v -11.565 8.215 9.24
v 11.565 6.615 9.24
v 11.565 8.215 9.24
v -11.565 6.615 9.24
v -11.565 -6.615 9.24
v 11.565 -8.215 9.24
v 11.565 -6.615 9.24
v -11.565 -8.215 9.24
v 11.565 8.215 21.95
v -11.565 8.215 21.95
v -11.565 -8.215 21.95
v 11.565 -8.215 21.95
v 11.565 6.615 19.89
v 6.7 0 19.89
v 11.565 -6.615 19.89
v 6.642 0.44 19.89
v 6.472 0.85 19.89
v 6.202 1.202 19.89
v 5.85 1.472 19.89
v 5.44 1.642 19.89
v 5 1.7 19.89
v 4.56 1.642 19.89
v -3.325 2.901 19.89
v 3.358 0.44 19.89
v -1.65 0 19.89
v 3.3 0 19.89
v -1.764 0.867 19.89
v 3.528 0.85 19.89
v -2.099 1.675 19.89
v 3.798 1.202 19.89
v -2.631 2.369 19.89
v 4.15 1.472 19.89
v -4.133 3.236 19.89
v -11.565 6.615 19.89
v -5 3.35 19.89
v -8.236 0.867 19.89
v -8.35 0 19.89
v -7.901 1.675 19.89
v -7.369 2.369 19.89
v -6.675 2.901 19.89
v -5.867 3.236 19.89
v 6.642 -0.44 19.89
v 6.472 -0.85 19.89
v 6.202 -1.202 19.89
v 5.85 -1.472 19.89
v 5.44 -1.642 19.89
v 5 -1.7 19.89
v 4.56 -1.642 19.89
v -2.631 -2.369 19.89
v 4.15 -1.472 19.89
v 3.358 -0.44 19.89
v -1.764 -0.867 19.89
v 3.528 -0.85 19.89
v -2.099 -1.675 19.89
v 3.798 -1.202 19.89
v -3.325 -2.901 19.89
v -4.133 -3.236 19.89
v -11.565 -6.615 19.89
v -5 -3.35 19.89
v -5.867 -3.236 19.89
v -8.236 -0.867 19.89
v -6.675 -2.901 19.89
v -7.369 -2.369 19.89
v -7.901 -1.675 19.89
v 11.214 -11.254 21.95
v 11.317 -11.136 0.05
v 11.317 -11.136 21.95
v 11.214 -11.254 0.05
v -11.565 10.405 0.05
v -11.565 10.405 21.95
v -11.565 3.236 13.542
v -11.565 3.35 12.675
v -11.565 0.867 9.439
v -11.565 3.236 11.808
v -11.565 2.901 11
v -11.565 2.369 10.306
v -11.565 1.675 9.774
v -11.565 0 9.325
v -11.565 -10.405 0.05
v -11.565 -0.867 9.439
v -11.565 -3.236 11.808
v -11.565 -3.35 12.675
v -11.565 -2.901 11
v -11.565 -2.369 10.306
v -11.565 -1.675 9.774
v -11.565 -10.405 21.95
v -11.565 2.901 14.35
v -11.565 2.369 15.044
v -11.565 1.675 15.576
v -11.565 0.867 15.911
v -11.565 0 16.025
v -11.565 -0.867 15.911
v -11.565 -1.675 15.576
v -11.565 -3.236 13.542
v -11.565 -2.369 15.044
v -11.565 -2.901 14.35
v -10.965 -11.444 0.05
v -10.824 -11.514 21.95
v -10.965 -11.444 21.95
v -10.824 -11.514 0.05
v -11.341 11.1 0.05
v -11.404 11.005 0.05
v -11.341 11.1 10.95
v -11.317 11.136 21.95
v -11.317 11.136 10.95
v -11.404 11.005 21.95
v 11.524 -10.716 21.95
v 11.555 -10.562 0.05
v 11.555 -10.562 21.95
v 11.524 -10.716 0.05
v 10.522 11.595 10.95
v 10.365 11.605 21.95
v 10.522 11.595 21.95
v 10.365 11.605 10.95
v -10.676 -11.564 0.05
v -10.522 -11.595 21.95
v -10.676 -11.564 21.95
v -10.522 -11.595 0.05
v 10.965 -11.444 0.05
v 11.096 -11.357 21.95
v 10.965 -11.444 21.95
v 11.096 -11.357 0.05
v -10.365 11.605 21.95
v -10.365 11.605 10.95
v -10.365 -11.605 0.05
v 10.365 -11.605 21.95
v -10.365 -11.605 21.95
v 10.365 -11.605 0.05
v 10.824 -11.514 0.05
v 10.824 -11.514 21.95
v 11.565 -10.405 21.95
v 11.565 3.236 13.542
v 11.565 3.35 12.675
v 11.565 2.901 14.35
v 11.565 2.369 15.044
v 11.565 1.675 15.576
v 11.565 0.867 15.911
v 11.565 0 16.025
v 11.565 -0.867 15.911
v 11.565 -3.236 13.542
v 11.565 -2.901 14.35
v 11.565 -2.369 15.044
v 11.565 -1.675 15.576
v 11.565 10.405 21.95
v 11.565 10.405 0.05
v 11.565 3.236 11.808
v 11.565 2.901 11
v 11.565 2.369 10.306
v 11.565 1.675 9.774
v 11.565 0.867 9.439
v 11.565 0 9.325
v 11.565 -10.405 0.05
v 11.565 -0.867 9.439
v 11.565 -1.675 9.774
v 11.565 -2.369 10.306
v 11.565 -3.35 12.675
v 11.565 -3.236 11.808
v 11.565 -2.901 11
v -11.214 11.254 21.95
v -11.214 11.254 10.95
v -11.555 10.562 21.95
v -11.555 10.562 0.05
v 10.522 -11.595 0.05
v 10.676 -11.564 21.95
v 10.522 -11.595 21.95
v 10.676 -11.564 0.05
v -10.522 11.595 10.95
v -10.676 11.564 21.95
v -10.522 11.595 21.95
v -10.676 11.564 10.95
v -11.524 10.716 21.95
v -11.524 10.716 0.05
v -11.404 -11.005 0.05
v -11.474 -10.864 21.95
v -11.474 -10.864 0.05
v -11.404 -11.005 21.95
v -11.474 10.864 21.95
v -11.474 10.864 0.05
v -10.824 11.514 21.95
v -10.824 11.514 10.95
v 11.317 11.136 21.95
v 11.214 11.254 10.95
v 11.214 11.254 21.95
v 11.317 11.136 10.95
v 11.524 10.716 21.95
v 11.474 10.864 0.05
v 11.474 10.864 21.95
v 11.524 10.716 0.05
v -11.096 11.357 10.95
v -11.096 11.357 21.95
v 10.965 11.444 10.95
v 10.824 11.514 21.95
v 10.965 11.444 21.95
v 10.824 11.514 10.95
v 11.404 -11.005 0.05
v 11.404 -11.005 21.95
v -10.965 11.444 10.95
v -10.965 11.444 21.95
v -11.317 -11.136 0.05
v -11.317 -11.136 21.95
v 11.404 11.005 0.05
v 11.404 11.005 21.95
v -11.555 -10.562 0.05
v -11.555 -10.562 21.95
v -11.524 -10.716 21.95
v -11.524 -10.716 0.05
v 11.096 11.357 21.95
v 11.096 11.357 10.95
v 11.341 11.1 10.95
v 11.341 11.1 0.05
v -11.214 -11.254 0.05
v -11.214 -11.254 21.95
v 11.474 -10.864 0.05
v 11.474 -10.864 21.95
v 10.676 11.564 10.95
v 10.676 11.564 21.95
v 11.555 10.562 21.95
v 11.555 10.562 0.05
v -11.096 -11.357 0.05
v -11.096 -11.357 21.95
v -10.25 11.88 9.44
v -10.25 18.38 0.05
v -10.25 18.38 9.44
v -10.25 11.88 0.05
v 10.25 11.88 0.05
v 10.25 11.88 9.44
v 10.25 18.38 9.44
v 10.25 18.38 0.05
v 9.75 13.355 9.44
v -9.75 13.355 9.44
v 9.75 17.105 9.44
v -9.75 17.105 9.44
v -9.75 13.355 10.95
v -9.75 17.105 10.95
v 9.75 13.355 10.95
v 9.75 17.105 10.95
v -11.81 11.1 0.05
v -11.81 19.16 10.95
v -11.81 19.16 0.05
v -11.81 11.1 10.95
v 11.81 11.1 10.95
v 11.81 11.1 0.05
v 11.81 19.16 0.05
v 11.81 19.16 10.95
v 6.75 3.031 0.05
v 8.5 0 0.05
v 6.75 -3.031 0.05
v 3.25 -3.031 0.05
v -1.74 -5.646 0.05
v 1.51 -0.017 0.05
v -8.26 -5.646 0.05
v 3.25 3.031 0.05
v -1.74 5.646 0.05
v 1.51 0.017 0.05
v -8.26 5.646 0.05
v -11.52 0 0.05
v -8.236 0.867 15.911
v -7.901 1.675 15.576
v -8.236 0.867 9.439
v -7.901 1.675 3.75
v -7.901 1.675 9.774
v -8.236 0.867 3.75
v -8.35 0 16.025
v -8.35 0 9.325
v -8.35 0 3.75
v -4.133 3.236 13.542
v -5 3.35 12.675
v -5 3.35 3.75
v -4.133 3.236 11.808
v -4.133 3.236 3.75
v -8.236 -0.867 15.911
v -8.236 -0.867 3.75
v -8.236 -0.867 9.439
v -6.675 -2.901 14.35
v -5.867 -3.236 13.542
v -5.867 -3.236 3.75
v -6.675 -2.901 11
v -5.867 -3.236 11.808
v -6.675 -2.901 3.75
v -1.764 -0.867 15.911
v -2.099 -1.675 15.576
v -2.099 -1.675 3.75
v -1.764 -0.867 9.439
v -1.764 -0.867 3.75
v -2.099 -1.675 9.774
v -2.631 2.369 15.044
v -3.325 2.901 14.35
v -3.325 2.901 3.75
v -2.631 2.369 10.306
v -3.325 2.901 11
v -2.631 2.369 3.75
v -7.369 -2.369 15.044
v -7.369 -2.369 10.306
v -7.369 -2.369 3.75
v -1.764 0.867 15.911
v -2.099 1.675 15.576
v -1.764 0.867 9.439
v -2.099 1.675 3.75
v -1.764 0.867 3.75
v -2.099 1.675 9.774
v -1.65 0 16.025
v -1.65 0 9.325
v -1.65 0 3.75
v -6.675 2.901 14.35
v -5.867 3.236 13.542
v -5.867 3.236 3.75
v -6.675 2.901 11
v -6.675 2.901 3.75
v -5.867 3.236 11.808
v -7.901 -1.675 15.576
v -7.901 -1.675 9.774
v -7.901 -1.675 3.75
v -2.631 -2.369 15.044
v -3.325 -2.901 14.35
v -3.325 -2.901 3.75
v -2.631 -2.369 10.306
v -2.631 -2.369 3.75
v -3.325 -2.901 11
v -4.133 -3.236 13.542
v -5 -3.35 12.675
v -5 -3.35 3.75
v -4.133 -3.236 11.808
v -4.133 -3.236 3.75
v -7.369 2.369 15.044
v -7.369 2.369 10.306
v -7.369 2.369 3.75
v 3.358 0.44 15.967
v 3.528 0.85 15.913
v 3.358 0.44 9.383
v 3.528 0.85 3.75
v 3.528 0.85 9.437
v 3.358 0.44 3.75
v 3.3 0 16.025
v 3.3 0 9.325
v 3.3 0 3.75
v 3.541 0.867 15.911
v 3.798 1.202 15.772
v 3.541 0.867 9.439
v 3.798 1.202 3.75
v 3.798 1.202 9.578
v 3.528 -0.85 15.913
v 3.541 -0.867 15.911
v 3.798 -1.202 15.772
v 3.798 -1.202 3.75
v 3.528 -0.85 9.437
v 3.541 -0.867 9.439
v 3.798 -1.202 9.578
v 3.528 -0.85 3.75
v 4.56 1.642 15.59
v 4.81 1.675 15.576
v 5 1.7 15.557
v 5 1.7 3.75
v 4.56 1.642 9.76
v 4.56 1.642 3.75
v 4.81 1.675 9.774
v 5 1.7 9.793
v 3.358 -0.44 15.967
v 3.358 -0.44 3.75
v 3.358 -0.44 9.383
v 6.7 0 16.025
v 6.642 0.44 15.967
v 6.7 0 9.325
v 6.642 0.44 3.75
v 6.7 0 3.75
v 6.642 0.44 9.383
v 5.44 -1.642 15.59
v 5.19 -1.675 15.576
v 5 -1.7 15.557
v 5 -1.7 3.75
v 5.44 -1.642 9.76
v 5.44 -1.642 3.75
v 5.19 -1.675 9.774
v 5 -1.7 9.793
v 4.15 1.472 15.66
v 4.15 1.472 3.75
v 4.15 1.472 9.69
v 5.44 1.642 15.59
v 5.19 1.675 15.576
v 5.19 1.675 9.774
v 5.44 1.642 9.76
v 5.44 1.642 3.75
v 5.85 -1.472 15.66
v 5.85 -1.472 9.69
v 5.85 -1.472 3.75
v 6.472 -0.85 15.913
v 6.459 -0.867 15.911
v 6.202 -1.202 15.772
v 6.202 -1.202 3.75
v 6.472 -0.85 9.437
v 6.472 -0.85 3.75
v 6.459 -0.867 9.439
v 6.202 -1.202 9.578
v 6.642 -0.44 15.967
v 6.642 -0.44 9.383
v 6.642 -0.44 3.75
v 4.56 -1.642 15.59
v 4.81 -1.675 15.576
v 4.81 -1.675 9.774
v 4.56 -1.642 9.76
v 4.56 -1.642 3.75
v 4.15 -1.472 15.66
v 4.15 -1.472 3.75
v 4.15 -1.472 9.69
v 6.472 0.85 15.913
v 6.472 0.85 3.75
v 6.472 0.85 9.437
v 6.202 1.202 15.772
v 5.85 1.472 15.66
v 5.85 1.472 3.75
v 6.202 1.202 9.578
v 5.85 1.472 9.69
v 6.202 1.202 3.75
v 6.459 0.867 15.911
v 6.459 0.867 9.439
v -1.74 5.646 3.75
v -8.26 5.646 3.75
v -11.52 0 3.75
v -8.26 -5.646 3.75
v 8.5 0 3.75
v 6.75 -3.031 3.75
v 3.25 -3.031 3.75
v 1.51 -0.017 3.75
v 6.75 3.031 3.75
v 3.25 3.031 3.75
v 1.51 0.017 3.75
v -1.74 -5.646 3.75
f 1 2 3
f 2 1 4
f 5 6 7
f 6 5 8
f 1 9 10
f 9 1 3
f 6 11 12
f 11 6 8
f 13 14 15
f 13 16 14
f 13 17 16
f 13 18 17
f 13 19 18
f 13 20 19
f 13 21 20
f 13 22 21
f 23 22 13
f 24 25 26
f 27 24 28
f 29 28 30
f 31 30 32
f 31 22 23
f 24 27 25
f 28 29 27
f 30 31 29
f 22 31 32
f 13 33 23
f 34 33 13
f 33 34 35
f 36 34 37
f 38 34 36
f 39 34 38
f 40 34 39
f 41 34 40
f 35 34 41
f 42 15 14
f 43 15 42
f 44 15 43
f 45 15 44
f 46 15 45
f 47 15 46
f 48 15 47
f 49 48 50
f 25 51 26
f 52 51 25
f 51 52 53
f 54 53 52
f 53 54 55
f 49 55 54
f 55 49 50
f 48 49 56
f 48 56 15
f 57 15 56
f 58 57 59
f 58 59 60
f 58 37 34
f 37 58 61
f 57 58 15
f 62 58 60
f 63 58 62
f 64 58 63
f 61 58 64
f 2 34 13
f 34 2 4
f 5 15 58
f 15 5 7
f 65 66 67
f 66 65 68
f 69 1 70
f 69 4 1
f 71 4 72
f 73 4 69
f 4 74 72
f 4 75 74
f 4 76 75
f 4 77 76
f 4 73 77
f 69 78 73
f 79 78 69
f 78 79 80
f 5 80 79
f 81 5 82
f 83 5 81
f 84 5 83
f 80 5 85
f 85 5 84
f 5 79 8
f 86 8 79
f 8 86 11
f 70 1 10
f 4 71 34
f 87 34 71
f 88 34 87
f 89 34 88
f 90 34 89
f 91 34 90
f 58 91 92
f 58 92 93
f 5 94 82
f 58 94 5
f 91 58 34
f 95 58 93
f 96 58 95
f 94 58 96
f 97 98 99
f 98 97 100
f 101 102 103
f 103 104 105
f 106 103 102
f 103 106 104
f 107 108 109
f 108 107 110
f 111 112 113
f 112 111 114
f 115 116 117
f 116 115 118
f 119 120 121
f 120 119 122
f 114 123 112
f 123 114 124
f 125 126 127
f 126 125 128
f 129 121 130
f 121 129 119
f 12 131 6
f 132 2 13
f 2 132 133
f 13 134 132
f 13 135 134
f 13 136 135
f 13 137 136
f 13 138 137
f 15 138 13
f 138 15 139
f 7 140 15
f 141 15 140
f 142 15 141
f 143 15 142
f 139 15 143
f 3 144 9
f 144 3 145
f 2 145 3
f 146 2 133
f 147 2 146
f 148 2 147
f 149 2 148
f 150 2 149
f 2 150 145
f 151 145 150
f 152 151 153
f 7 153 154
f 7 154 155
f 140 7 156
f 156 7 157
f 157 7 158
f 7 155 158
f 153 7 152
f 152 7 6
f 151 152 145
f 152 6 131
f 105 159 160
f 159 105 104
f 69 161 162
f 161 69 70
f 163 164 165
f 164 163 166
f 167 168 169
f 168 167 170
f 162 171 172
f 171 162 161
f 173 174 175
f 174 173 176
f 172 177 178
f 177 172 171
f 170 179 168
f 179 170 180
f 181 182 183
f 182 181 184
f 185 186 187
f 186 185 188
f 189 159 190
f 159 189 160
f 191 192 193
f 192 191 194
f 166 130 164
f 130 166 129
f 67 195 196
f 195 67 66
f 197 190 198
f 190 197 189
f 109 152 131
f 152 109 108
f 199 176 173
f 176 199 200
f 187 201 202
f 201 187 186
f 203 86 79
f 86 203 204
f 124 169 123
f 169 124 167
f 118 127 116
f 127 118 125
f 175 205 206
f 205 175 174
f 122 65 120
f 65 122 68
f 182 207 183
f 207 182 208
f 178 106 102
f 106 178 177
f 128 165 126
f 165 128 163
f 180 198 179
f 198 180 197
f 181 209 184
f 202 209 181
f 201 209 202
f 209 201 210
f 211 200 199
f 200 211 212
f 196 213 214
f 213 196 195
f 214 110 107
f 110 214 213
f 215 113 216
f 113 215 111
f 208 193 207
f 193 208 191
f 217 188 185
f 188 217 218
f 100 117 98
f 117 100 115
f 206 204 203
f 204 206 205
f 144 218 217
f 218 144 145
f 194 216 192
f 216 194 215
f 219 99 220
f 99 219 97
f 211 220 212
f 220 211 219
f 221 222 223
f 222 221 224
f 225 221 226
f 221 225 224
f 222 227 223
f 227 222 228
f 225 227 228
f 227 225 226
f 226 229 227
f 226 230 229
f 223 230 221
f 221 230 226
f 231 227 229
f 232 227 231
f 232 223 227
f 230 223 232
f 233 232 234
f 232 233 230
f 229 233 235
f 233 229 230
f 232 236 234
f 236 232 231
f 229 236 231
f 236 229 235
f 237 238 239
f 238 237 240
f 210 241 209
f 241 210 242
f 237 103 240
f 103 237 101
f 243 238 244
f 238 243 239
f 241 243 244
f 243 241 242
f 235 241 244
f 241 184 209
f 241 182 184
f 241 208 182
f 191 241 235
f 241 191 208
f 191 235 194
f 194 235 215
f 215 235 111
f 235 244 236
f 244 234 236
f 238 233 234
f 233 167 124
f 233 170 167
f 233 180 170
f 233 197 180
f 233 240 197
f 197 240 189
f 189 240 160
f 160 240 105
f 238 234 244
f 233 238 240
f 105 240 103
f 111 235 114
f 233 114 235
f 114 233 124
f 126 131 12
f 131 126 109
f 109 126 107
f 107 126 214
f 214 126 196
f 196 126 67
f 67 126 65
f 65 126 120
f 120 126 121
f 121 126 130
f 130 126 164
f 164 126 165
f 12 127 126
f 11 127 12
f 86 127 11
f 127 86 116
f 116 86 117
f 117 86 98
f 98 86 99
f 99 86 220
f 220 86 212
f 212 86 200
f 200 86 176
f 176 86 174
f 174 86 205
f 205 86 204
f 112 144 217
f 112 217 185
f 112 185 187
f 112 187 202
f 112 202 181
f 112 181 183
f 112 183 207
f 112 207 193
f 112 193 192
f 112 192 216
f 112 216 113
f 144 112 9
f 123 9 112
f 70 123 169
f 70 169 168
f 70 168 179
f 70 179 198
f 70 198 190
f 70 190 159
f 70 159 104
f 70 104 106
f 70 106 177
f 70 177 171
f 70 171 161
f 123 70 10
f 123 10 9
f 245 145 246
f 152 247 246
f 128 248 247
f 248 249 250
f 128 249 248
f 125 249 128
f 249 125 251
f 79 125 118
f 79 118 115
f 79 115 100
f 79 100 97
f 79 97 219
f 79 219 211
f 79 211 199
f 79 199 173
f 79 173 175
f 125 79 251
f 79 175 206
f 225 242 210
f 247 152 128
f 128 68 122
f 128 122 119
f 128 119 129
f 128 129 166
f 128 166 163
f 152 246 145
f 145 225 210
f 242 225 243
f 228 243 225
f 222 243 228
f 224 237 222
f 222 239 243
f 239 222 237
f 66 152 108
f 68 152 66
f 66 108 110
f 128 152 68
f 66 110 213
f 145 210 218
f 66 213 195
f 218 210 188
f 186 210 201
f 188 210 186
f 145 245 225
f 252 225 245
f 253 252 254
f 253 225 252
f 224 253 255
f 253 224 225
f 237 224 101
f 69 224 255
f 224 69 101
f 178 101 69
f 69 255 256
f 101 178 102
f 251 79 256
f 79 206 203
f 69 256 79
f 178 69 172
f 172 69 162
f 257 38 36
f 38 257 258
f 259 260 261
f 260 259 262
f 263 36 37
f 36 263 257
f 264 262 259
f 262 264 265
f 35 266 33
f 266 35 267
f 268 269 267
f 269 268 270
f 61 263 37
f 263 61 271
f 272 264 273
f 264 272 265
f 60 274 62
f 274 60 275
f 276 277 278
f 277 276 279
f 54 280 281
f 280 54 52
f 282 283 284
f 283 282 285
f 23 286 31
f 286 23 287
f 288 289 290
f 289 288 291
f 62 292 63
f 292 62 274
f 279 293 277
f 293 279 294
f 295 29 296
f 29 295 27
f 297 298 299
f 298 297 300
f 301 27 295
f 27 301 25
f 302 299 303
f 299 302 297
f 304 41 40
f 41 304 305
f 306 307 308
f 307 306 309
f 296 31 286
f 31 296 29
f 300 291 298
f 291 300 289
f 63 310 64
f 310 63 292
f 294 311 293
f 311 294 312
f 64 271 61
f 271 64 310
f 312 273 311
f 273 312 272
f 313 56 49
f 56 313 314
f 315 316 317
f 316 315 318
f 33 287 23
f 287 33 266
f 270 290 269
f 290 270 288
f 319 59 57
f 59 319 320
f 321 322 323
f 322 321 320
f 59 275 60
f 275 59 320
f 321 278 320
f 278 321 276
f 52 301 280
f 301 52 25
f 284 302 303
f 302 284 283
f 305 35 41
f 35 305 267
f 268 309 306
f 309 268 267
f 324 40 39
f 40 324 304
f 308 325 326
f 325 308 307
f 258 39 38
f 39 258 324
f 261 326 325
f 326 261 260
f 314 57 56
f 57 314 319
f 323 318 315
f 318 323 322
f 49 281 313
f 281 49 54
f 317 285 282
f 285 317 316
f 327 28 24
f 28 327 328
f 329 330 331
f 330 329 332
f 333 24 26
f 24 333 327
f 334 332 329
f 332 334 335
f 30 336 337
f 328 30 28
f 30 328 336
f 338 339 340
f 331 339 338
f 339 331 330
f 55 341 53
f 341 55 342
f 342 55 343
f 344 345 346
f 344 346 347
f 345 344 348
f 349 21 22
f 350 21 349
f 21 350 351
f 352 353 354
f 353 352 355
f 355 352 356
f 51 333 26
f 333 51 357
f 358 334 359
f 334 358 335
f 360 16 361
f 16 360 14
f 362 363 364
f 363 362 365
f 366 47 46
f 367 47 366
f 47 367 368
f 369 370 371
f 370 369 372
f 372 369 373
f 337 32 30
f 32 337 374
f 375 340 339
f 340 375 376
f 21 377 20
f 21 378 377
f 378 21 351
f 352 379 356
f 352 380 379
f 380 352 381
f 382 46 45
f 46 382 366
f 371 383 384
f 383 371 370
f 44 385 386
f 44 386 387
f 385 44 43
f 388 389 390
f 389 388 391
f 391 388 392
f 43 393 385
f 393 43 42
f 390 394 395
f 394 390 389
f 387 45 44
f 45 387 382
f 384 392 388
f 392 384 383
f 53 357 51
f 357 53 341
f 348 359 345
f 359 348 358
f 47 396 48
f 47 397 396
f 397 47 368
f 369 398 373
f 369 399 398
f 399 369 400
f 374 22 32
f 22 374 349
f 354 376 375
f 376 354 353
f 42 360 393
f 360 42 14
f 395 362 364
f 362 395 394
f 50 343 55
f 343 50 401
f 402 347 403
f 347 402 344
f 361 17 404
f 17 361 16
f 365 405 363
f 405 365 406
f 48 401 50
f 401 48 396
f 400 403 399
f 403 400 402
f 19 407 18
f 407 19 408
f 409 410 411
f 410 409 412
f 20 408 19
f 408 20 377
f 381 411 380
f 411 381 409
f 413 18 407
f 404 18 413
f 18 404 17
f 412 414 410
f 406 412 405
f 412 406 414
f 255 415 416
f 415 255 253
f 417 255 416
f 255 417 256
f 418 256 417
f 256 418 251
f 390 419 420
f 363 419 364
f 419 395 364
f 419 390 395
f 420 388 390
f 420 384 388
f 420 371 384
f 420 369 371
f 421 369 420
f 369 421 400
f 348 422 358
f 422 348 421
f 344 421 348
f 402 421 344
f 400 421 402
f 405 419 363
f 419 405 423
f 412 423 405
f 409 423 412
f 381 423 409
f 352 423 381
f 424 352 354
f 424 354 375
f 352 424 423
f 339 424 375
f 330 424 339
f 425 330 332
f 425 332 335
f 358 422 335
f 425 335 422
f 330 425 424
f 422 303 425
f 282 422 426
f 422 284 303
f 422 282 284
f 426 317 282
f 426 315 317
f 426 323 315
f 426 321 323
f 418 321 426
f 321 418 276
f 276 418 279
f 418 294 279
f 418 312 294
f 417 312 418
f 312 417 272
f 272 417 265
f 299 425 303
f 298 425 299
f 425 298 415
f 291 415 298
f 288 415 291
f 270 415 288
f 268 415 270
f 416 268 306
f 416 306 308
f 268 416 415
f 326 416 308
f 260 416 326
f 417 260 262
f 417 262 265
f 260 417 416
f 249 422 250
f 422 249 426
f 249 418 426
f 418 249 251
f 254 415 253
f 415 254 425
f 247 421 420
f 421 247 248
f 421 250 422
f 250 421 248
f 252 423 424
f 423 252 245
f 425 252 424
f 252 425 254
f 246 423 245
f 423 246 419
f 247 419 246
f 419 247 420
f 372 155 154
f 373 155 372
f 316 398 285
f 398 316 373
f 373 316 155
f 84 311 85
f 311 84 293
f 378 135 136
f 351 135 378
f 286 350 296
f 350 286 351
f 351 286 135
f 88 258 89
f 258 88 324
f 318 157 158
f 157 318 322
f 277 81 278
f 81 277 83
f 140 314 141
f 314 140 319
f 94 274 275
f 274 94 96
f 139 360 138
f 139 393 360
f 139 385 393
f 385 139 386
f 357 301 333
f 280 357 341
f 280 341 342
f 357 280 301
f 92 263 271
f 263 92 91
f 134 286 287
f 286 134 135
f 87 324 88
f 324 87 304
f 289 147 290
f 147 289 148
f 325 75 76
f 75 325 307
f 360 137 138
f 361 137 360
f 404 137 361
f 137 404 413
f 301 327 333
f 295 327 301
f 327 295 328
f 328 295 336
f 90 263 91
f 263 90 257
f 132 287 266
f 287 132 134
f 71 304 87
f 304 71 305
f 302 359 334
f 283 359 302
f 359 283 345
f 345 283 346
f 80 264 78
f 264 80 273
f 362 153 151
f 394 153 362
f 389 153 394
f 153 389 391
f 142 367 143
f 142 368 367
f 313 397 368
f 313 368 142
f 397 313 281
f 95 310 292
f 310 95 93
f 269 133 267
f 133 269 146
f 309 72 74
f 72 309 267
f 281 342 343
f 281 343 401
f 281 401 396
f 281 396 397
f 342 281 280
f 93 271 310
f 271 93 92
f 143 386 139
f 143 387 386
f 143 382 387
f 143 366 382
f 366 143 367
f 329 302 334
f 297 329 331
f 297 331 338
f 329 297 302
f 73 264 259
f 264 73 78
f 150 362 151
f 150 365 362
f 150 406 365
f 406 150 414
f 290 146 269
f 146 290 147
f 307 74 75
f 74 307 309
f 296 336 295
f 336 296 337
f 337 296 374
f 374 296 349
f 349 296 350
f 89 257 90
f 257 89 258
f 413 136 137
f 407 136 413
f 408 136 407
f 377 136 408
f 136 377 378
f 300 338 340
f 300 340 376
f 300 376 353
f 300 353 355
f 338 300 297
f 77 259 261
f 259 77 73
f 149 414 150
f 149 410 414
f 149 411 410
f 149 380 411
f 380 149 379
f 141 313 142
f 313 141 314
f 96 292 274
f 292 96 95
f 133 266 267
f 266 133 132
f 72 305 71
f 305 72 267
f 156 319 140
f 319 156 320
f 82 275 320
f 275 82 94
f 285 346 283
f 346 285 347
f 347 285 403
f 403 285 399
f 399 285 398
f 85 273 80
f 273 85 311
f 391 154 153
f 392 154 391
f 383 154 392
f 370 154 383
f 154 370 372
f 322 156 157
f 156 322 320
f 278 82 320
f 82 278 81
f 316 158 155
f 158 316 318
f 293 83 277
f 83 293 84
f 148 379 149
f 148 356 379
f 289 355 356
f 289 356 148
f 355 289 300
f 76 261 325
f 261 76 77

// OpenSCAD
// file: Abar.scad
// generate C-channel for later use in cut-outs

mW = 16.33;
mH = 12.66;
L = 120;
pad=.1;
W = mW+pad;
H = mH+pad;
block = [L,W,H];
cutW = (1.5 * 2) + (pad * 2);
cutH = (2.0 + pad);

module abar(bblock=block){

translate([0,0,H/2])
difference(){
	cube(bblock, center=true);
	
	translate([0,0,cutH/2+.01])
		cube([L,W-cutW, H-cutH], center=true);
	}
}

abar();
// main file
// attach things to base...

use <./Abar.scad>

cB=25;
tubeXY = 19.25;
swX = 20.5;
swY = 10.3;
swZ = 6.5;
wireThick = 3.1;
wireZ = 3.65;
wire1 = 1.11;
wire2 = 12.5;
wire3 = 19.5;
leverHinge = 3.4;
leverExtends = 19.35;
hole1X = 5.15;
hole2X = 14.67;
holeY = 2.78;
holeRad = 2.5/2;
sur = 1.56;
totalX = sur*2 + swX;
totalY = sur + swY;
totalZ = swZ + sur;
posX = totalX/2;
posY = totalY/2 + sur/2;
posZ = totalZ/2;
groove= 1.75;
pH = 30;
Ang = -120;

module switch(){
	cube([swX,swY,swZ], center=true);
	translate([0 ,-posY,-.1])
		cube([wire3, 3+2+.1, wireZ+.1], center=true);
}

module switchbox(){
	difference(){
		union(){
		translate([totalX/2,totalY/2,totalZ/2])
			cube([totalX,totalY-.1,totalZ], center=true);			
		}
		translate([posX,posY,posZ])
			switch();
	}
}

module aluTube(){
	cube([tubeXY,tubeXY, pH+.1], center=true);
	translate([tubeXY/2+.1, 0, 0])
		cylinder(r=groove, h=pH+.1, center=true, $fn=16);
	translate([tubeXY/2+.1, tubeXY/3, 0])
		cylinder(r=groove, h=pH+.1, center=true, $fn=16);
	translate([tubeXY/2+.1, -tubeXY/3, 0])
		cylinder(r=groove, h=pH+.1, center=true, $fn=16);
	hull(){
	translate([-tubeXY/2 - sur*2+.2, 0, -pH/2]) rotate([0,-90,0])
		cylinder(r1=tubeXY/2-3, r2=tubeXY/2+sur*4-3, h=sur*4+.1, center=true);
	translate([-tubeXY/2 - sur*2+.2, 0, pH/2]) rotate([0,-90,0])
		cylinder(r1=tubeXY/2-3, r2=tubeXY/2+sur*4-3, h=sur*4+.1,center=true);
		}
}

module plasticTube(cH=pH/2){
	minkowski(){
	cube([tubeXY+sur*3-3.2,tubeXY+sur, cH], center=true);
	cylinder(r=1.2, h=cH, $fn=48, center=true);
	}

}

module holderclip(){
	difference(){
	plasticTube();
	aluTube();
	}
}

module placeBox(){
	difference(){
		union(){
		translate([-totalX/6-(pH/2*sin(-Ang)-3.7),-tubeXY/2-swY/2-.667,-pH/3]) rotate([90,0,12.7])
		switchbox();
	rotate([12.7,90-Ang,0])
		holderclip();
		}
	translate([-totalX/2,-tubeXY/2,-pH/3+posY-26.5]) rotate([0,0,12.7])
	cube([100,100,40],center=true);
	translate([-totalX/2,-tubeXY,+pH/3-posY+18.5]) rotate([0,0,12.7])
	cube([100,100,40], center=true);
	}
}

module holderBar(){
	difference(){
	plasticTube();
	translate([0,0,+11]) rotate([180,0,0])
		abar();
	}
}

module connectBar(){
	difference(){
		union(){
		translate([0,0,pH/2]) rotate([180,0,0])
		holderBar();
		translate([-swX/2-sur,+totalY+swY-3,pH/2]) rotate([90,0,0])
		switchbox();
		}
		translate([0,0,2]) rotate([0,0,0])
			cube([100,100,4.1], center=true);
		translate([0,0,pH-2]) rotate([0,0,0])
			cube([100,100,4.1], center=true);
		translate([5,0,0]) rotate([0,0,0])
			cylinder(r=3.35, h=80, center=true, $fn=24);
		translate([-5,0,0]) rotate([0,0,0])
			cylinder(r=1.7, h=80, center=true, $fn=24);
		translate([5,0,pH-5]) rotate([0,0,0])
			cylinder(r=6.52, h=5.5, center=true, $fn=6);
		translate([-5,0,pH-5]) rotate([0,0,0])
			cylinder(r=3.5, h=5.5, center=true, $fn=6);
		translate([0,0,pH/2-3.35/2]) rotate([0,90,0])
			cylinder(r=3.35, h=200, center=true, $fn=24);

	}
}
translate([0,0,pH-4]) rotate([0,180,0])
	connectBar();
